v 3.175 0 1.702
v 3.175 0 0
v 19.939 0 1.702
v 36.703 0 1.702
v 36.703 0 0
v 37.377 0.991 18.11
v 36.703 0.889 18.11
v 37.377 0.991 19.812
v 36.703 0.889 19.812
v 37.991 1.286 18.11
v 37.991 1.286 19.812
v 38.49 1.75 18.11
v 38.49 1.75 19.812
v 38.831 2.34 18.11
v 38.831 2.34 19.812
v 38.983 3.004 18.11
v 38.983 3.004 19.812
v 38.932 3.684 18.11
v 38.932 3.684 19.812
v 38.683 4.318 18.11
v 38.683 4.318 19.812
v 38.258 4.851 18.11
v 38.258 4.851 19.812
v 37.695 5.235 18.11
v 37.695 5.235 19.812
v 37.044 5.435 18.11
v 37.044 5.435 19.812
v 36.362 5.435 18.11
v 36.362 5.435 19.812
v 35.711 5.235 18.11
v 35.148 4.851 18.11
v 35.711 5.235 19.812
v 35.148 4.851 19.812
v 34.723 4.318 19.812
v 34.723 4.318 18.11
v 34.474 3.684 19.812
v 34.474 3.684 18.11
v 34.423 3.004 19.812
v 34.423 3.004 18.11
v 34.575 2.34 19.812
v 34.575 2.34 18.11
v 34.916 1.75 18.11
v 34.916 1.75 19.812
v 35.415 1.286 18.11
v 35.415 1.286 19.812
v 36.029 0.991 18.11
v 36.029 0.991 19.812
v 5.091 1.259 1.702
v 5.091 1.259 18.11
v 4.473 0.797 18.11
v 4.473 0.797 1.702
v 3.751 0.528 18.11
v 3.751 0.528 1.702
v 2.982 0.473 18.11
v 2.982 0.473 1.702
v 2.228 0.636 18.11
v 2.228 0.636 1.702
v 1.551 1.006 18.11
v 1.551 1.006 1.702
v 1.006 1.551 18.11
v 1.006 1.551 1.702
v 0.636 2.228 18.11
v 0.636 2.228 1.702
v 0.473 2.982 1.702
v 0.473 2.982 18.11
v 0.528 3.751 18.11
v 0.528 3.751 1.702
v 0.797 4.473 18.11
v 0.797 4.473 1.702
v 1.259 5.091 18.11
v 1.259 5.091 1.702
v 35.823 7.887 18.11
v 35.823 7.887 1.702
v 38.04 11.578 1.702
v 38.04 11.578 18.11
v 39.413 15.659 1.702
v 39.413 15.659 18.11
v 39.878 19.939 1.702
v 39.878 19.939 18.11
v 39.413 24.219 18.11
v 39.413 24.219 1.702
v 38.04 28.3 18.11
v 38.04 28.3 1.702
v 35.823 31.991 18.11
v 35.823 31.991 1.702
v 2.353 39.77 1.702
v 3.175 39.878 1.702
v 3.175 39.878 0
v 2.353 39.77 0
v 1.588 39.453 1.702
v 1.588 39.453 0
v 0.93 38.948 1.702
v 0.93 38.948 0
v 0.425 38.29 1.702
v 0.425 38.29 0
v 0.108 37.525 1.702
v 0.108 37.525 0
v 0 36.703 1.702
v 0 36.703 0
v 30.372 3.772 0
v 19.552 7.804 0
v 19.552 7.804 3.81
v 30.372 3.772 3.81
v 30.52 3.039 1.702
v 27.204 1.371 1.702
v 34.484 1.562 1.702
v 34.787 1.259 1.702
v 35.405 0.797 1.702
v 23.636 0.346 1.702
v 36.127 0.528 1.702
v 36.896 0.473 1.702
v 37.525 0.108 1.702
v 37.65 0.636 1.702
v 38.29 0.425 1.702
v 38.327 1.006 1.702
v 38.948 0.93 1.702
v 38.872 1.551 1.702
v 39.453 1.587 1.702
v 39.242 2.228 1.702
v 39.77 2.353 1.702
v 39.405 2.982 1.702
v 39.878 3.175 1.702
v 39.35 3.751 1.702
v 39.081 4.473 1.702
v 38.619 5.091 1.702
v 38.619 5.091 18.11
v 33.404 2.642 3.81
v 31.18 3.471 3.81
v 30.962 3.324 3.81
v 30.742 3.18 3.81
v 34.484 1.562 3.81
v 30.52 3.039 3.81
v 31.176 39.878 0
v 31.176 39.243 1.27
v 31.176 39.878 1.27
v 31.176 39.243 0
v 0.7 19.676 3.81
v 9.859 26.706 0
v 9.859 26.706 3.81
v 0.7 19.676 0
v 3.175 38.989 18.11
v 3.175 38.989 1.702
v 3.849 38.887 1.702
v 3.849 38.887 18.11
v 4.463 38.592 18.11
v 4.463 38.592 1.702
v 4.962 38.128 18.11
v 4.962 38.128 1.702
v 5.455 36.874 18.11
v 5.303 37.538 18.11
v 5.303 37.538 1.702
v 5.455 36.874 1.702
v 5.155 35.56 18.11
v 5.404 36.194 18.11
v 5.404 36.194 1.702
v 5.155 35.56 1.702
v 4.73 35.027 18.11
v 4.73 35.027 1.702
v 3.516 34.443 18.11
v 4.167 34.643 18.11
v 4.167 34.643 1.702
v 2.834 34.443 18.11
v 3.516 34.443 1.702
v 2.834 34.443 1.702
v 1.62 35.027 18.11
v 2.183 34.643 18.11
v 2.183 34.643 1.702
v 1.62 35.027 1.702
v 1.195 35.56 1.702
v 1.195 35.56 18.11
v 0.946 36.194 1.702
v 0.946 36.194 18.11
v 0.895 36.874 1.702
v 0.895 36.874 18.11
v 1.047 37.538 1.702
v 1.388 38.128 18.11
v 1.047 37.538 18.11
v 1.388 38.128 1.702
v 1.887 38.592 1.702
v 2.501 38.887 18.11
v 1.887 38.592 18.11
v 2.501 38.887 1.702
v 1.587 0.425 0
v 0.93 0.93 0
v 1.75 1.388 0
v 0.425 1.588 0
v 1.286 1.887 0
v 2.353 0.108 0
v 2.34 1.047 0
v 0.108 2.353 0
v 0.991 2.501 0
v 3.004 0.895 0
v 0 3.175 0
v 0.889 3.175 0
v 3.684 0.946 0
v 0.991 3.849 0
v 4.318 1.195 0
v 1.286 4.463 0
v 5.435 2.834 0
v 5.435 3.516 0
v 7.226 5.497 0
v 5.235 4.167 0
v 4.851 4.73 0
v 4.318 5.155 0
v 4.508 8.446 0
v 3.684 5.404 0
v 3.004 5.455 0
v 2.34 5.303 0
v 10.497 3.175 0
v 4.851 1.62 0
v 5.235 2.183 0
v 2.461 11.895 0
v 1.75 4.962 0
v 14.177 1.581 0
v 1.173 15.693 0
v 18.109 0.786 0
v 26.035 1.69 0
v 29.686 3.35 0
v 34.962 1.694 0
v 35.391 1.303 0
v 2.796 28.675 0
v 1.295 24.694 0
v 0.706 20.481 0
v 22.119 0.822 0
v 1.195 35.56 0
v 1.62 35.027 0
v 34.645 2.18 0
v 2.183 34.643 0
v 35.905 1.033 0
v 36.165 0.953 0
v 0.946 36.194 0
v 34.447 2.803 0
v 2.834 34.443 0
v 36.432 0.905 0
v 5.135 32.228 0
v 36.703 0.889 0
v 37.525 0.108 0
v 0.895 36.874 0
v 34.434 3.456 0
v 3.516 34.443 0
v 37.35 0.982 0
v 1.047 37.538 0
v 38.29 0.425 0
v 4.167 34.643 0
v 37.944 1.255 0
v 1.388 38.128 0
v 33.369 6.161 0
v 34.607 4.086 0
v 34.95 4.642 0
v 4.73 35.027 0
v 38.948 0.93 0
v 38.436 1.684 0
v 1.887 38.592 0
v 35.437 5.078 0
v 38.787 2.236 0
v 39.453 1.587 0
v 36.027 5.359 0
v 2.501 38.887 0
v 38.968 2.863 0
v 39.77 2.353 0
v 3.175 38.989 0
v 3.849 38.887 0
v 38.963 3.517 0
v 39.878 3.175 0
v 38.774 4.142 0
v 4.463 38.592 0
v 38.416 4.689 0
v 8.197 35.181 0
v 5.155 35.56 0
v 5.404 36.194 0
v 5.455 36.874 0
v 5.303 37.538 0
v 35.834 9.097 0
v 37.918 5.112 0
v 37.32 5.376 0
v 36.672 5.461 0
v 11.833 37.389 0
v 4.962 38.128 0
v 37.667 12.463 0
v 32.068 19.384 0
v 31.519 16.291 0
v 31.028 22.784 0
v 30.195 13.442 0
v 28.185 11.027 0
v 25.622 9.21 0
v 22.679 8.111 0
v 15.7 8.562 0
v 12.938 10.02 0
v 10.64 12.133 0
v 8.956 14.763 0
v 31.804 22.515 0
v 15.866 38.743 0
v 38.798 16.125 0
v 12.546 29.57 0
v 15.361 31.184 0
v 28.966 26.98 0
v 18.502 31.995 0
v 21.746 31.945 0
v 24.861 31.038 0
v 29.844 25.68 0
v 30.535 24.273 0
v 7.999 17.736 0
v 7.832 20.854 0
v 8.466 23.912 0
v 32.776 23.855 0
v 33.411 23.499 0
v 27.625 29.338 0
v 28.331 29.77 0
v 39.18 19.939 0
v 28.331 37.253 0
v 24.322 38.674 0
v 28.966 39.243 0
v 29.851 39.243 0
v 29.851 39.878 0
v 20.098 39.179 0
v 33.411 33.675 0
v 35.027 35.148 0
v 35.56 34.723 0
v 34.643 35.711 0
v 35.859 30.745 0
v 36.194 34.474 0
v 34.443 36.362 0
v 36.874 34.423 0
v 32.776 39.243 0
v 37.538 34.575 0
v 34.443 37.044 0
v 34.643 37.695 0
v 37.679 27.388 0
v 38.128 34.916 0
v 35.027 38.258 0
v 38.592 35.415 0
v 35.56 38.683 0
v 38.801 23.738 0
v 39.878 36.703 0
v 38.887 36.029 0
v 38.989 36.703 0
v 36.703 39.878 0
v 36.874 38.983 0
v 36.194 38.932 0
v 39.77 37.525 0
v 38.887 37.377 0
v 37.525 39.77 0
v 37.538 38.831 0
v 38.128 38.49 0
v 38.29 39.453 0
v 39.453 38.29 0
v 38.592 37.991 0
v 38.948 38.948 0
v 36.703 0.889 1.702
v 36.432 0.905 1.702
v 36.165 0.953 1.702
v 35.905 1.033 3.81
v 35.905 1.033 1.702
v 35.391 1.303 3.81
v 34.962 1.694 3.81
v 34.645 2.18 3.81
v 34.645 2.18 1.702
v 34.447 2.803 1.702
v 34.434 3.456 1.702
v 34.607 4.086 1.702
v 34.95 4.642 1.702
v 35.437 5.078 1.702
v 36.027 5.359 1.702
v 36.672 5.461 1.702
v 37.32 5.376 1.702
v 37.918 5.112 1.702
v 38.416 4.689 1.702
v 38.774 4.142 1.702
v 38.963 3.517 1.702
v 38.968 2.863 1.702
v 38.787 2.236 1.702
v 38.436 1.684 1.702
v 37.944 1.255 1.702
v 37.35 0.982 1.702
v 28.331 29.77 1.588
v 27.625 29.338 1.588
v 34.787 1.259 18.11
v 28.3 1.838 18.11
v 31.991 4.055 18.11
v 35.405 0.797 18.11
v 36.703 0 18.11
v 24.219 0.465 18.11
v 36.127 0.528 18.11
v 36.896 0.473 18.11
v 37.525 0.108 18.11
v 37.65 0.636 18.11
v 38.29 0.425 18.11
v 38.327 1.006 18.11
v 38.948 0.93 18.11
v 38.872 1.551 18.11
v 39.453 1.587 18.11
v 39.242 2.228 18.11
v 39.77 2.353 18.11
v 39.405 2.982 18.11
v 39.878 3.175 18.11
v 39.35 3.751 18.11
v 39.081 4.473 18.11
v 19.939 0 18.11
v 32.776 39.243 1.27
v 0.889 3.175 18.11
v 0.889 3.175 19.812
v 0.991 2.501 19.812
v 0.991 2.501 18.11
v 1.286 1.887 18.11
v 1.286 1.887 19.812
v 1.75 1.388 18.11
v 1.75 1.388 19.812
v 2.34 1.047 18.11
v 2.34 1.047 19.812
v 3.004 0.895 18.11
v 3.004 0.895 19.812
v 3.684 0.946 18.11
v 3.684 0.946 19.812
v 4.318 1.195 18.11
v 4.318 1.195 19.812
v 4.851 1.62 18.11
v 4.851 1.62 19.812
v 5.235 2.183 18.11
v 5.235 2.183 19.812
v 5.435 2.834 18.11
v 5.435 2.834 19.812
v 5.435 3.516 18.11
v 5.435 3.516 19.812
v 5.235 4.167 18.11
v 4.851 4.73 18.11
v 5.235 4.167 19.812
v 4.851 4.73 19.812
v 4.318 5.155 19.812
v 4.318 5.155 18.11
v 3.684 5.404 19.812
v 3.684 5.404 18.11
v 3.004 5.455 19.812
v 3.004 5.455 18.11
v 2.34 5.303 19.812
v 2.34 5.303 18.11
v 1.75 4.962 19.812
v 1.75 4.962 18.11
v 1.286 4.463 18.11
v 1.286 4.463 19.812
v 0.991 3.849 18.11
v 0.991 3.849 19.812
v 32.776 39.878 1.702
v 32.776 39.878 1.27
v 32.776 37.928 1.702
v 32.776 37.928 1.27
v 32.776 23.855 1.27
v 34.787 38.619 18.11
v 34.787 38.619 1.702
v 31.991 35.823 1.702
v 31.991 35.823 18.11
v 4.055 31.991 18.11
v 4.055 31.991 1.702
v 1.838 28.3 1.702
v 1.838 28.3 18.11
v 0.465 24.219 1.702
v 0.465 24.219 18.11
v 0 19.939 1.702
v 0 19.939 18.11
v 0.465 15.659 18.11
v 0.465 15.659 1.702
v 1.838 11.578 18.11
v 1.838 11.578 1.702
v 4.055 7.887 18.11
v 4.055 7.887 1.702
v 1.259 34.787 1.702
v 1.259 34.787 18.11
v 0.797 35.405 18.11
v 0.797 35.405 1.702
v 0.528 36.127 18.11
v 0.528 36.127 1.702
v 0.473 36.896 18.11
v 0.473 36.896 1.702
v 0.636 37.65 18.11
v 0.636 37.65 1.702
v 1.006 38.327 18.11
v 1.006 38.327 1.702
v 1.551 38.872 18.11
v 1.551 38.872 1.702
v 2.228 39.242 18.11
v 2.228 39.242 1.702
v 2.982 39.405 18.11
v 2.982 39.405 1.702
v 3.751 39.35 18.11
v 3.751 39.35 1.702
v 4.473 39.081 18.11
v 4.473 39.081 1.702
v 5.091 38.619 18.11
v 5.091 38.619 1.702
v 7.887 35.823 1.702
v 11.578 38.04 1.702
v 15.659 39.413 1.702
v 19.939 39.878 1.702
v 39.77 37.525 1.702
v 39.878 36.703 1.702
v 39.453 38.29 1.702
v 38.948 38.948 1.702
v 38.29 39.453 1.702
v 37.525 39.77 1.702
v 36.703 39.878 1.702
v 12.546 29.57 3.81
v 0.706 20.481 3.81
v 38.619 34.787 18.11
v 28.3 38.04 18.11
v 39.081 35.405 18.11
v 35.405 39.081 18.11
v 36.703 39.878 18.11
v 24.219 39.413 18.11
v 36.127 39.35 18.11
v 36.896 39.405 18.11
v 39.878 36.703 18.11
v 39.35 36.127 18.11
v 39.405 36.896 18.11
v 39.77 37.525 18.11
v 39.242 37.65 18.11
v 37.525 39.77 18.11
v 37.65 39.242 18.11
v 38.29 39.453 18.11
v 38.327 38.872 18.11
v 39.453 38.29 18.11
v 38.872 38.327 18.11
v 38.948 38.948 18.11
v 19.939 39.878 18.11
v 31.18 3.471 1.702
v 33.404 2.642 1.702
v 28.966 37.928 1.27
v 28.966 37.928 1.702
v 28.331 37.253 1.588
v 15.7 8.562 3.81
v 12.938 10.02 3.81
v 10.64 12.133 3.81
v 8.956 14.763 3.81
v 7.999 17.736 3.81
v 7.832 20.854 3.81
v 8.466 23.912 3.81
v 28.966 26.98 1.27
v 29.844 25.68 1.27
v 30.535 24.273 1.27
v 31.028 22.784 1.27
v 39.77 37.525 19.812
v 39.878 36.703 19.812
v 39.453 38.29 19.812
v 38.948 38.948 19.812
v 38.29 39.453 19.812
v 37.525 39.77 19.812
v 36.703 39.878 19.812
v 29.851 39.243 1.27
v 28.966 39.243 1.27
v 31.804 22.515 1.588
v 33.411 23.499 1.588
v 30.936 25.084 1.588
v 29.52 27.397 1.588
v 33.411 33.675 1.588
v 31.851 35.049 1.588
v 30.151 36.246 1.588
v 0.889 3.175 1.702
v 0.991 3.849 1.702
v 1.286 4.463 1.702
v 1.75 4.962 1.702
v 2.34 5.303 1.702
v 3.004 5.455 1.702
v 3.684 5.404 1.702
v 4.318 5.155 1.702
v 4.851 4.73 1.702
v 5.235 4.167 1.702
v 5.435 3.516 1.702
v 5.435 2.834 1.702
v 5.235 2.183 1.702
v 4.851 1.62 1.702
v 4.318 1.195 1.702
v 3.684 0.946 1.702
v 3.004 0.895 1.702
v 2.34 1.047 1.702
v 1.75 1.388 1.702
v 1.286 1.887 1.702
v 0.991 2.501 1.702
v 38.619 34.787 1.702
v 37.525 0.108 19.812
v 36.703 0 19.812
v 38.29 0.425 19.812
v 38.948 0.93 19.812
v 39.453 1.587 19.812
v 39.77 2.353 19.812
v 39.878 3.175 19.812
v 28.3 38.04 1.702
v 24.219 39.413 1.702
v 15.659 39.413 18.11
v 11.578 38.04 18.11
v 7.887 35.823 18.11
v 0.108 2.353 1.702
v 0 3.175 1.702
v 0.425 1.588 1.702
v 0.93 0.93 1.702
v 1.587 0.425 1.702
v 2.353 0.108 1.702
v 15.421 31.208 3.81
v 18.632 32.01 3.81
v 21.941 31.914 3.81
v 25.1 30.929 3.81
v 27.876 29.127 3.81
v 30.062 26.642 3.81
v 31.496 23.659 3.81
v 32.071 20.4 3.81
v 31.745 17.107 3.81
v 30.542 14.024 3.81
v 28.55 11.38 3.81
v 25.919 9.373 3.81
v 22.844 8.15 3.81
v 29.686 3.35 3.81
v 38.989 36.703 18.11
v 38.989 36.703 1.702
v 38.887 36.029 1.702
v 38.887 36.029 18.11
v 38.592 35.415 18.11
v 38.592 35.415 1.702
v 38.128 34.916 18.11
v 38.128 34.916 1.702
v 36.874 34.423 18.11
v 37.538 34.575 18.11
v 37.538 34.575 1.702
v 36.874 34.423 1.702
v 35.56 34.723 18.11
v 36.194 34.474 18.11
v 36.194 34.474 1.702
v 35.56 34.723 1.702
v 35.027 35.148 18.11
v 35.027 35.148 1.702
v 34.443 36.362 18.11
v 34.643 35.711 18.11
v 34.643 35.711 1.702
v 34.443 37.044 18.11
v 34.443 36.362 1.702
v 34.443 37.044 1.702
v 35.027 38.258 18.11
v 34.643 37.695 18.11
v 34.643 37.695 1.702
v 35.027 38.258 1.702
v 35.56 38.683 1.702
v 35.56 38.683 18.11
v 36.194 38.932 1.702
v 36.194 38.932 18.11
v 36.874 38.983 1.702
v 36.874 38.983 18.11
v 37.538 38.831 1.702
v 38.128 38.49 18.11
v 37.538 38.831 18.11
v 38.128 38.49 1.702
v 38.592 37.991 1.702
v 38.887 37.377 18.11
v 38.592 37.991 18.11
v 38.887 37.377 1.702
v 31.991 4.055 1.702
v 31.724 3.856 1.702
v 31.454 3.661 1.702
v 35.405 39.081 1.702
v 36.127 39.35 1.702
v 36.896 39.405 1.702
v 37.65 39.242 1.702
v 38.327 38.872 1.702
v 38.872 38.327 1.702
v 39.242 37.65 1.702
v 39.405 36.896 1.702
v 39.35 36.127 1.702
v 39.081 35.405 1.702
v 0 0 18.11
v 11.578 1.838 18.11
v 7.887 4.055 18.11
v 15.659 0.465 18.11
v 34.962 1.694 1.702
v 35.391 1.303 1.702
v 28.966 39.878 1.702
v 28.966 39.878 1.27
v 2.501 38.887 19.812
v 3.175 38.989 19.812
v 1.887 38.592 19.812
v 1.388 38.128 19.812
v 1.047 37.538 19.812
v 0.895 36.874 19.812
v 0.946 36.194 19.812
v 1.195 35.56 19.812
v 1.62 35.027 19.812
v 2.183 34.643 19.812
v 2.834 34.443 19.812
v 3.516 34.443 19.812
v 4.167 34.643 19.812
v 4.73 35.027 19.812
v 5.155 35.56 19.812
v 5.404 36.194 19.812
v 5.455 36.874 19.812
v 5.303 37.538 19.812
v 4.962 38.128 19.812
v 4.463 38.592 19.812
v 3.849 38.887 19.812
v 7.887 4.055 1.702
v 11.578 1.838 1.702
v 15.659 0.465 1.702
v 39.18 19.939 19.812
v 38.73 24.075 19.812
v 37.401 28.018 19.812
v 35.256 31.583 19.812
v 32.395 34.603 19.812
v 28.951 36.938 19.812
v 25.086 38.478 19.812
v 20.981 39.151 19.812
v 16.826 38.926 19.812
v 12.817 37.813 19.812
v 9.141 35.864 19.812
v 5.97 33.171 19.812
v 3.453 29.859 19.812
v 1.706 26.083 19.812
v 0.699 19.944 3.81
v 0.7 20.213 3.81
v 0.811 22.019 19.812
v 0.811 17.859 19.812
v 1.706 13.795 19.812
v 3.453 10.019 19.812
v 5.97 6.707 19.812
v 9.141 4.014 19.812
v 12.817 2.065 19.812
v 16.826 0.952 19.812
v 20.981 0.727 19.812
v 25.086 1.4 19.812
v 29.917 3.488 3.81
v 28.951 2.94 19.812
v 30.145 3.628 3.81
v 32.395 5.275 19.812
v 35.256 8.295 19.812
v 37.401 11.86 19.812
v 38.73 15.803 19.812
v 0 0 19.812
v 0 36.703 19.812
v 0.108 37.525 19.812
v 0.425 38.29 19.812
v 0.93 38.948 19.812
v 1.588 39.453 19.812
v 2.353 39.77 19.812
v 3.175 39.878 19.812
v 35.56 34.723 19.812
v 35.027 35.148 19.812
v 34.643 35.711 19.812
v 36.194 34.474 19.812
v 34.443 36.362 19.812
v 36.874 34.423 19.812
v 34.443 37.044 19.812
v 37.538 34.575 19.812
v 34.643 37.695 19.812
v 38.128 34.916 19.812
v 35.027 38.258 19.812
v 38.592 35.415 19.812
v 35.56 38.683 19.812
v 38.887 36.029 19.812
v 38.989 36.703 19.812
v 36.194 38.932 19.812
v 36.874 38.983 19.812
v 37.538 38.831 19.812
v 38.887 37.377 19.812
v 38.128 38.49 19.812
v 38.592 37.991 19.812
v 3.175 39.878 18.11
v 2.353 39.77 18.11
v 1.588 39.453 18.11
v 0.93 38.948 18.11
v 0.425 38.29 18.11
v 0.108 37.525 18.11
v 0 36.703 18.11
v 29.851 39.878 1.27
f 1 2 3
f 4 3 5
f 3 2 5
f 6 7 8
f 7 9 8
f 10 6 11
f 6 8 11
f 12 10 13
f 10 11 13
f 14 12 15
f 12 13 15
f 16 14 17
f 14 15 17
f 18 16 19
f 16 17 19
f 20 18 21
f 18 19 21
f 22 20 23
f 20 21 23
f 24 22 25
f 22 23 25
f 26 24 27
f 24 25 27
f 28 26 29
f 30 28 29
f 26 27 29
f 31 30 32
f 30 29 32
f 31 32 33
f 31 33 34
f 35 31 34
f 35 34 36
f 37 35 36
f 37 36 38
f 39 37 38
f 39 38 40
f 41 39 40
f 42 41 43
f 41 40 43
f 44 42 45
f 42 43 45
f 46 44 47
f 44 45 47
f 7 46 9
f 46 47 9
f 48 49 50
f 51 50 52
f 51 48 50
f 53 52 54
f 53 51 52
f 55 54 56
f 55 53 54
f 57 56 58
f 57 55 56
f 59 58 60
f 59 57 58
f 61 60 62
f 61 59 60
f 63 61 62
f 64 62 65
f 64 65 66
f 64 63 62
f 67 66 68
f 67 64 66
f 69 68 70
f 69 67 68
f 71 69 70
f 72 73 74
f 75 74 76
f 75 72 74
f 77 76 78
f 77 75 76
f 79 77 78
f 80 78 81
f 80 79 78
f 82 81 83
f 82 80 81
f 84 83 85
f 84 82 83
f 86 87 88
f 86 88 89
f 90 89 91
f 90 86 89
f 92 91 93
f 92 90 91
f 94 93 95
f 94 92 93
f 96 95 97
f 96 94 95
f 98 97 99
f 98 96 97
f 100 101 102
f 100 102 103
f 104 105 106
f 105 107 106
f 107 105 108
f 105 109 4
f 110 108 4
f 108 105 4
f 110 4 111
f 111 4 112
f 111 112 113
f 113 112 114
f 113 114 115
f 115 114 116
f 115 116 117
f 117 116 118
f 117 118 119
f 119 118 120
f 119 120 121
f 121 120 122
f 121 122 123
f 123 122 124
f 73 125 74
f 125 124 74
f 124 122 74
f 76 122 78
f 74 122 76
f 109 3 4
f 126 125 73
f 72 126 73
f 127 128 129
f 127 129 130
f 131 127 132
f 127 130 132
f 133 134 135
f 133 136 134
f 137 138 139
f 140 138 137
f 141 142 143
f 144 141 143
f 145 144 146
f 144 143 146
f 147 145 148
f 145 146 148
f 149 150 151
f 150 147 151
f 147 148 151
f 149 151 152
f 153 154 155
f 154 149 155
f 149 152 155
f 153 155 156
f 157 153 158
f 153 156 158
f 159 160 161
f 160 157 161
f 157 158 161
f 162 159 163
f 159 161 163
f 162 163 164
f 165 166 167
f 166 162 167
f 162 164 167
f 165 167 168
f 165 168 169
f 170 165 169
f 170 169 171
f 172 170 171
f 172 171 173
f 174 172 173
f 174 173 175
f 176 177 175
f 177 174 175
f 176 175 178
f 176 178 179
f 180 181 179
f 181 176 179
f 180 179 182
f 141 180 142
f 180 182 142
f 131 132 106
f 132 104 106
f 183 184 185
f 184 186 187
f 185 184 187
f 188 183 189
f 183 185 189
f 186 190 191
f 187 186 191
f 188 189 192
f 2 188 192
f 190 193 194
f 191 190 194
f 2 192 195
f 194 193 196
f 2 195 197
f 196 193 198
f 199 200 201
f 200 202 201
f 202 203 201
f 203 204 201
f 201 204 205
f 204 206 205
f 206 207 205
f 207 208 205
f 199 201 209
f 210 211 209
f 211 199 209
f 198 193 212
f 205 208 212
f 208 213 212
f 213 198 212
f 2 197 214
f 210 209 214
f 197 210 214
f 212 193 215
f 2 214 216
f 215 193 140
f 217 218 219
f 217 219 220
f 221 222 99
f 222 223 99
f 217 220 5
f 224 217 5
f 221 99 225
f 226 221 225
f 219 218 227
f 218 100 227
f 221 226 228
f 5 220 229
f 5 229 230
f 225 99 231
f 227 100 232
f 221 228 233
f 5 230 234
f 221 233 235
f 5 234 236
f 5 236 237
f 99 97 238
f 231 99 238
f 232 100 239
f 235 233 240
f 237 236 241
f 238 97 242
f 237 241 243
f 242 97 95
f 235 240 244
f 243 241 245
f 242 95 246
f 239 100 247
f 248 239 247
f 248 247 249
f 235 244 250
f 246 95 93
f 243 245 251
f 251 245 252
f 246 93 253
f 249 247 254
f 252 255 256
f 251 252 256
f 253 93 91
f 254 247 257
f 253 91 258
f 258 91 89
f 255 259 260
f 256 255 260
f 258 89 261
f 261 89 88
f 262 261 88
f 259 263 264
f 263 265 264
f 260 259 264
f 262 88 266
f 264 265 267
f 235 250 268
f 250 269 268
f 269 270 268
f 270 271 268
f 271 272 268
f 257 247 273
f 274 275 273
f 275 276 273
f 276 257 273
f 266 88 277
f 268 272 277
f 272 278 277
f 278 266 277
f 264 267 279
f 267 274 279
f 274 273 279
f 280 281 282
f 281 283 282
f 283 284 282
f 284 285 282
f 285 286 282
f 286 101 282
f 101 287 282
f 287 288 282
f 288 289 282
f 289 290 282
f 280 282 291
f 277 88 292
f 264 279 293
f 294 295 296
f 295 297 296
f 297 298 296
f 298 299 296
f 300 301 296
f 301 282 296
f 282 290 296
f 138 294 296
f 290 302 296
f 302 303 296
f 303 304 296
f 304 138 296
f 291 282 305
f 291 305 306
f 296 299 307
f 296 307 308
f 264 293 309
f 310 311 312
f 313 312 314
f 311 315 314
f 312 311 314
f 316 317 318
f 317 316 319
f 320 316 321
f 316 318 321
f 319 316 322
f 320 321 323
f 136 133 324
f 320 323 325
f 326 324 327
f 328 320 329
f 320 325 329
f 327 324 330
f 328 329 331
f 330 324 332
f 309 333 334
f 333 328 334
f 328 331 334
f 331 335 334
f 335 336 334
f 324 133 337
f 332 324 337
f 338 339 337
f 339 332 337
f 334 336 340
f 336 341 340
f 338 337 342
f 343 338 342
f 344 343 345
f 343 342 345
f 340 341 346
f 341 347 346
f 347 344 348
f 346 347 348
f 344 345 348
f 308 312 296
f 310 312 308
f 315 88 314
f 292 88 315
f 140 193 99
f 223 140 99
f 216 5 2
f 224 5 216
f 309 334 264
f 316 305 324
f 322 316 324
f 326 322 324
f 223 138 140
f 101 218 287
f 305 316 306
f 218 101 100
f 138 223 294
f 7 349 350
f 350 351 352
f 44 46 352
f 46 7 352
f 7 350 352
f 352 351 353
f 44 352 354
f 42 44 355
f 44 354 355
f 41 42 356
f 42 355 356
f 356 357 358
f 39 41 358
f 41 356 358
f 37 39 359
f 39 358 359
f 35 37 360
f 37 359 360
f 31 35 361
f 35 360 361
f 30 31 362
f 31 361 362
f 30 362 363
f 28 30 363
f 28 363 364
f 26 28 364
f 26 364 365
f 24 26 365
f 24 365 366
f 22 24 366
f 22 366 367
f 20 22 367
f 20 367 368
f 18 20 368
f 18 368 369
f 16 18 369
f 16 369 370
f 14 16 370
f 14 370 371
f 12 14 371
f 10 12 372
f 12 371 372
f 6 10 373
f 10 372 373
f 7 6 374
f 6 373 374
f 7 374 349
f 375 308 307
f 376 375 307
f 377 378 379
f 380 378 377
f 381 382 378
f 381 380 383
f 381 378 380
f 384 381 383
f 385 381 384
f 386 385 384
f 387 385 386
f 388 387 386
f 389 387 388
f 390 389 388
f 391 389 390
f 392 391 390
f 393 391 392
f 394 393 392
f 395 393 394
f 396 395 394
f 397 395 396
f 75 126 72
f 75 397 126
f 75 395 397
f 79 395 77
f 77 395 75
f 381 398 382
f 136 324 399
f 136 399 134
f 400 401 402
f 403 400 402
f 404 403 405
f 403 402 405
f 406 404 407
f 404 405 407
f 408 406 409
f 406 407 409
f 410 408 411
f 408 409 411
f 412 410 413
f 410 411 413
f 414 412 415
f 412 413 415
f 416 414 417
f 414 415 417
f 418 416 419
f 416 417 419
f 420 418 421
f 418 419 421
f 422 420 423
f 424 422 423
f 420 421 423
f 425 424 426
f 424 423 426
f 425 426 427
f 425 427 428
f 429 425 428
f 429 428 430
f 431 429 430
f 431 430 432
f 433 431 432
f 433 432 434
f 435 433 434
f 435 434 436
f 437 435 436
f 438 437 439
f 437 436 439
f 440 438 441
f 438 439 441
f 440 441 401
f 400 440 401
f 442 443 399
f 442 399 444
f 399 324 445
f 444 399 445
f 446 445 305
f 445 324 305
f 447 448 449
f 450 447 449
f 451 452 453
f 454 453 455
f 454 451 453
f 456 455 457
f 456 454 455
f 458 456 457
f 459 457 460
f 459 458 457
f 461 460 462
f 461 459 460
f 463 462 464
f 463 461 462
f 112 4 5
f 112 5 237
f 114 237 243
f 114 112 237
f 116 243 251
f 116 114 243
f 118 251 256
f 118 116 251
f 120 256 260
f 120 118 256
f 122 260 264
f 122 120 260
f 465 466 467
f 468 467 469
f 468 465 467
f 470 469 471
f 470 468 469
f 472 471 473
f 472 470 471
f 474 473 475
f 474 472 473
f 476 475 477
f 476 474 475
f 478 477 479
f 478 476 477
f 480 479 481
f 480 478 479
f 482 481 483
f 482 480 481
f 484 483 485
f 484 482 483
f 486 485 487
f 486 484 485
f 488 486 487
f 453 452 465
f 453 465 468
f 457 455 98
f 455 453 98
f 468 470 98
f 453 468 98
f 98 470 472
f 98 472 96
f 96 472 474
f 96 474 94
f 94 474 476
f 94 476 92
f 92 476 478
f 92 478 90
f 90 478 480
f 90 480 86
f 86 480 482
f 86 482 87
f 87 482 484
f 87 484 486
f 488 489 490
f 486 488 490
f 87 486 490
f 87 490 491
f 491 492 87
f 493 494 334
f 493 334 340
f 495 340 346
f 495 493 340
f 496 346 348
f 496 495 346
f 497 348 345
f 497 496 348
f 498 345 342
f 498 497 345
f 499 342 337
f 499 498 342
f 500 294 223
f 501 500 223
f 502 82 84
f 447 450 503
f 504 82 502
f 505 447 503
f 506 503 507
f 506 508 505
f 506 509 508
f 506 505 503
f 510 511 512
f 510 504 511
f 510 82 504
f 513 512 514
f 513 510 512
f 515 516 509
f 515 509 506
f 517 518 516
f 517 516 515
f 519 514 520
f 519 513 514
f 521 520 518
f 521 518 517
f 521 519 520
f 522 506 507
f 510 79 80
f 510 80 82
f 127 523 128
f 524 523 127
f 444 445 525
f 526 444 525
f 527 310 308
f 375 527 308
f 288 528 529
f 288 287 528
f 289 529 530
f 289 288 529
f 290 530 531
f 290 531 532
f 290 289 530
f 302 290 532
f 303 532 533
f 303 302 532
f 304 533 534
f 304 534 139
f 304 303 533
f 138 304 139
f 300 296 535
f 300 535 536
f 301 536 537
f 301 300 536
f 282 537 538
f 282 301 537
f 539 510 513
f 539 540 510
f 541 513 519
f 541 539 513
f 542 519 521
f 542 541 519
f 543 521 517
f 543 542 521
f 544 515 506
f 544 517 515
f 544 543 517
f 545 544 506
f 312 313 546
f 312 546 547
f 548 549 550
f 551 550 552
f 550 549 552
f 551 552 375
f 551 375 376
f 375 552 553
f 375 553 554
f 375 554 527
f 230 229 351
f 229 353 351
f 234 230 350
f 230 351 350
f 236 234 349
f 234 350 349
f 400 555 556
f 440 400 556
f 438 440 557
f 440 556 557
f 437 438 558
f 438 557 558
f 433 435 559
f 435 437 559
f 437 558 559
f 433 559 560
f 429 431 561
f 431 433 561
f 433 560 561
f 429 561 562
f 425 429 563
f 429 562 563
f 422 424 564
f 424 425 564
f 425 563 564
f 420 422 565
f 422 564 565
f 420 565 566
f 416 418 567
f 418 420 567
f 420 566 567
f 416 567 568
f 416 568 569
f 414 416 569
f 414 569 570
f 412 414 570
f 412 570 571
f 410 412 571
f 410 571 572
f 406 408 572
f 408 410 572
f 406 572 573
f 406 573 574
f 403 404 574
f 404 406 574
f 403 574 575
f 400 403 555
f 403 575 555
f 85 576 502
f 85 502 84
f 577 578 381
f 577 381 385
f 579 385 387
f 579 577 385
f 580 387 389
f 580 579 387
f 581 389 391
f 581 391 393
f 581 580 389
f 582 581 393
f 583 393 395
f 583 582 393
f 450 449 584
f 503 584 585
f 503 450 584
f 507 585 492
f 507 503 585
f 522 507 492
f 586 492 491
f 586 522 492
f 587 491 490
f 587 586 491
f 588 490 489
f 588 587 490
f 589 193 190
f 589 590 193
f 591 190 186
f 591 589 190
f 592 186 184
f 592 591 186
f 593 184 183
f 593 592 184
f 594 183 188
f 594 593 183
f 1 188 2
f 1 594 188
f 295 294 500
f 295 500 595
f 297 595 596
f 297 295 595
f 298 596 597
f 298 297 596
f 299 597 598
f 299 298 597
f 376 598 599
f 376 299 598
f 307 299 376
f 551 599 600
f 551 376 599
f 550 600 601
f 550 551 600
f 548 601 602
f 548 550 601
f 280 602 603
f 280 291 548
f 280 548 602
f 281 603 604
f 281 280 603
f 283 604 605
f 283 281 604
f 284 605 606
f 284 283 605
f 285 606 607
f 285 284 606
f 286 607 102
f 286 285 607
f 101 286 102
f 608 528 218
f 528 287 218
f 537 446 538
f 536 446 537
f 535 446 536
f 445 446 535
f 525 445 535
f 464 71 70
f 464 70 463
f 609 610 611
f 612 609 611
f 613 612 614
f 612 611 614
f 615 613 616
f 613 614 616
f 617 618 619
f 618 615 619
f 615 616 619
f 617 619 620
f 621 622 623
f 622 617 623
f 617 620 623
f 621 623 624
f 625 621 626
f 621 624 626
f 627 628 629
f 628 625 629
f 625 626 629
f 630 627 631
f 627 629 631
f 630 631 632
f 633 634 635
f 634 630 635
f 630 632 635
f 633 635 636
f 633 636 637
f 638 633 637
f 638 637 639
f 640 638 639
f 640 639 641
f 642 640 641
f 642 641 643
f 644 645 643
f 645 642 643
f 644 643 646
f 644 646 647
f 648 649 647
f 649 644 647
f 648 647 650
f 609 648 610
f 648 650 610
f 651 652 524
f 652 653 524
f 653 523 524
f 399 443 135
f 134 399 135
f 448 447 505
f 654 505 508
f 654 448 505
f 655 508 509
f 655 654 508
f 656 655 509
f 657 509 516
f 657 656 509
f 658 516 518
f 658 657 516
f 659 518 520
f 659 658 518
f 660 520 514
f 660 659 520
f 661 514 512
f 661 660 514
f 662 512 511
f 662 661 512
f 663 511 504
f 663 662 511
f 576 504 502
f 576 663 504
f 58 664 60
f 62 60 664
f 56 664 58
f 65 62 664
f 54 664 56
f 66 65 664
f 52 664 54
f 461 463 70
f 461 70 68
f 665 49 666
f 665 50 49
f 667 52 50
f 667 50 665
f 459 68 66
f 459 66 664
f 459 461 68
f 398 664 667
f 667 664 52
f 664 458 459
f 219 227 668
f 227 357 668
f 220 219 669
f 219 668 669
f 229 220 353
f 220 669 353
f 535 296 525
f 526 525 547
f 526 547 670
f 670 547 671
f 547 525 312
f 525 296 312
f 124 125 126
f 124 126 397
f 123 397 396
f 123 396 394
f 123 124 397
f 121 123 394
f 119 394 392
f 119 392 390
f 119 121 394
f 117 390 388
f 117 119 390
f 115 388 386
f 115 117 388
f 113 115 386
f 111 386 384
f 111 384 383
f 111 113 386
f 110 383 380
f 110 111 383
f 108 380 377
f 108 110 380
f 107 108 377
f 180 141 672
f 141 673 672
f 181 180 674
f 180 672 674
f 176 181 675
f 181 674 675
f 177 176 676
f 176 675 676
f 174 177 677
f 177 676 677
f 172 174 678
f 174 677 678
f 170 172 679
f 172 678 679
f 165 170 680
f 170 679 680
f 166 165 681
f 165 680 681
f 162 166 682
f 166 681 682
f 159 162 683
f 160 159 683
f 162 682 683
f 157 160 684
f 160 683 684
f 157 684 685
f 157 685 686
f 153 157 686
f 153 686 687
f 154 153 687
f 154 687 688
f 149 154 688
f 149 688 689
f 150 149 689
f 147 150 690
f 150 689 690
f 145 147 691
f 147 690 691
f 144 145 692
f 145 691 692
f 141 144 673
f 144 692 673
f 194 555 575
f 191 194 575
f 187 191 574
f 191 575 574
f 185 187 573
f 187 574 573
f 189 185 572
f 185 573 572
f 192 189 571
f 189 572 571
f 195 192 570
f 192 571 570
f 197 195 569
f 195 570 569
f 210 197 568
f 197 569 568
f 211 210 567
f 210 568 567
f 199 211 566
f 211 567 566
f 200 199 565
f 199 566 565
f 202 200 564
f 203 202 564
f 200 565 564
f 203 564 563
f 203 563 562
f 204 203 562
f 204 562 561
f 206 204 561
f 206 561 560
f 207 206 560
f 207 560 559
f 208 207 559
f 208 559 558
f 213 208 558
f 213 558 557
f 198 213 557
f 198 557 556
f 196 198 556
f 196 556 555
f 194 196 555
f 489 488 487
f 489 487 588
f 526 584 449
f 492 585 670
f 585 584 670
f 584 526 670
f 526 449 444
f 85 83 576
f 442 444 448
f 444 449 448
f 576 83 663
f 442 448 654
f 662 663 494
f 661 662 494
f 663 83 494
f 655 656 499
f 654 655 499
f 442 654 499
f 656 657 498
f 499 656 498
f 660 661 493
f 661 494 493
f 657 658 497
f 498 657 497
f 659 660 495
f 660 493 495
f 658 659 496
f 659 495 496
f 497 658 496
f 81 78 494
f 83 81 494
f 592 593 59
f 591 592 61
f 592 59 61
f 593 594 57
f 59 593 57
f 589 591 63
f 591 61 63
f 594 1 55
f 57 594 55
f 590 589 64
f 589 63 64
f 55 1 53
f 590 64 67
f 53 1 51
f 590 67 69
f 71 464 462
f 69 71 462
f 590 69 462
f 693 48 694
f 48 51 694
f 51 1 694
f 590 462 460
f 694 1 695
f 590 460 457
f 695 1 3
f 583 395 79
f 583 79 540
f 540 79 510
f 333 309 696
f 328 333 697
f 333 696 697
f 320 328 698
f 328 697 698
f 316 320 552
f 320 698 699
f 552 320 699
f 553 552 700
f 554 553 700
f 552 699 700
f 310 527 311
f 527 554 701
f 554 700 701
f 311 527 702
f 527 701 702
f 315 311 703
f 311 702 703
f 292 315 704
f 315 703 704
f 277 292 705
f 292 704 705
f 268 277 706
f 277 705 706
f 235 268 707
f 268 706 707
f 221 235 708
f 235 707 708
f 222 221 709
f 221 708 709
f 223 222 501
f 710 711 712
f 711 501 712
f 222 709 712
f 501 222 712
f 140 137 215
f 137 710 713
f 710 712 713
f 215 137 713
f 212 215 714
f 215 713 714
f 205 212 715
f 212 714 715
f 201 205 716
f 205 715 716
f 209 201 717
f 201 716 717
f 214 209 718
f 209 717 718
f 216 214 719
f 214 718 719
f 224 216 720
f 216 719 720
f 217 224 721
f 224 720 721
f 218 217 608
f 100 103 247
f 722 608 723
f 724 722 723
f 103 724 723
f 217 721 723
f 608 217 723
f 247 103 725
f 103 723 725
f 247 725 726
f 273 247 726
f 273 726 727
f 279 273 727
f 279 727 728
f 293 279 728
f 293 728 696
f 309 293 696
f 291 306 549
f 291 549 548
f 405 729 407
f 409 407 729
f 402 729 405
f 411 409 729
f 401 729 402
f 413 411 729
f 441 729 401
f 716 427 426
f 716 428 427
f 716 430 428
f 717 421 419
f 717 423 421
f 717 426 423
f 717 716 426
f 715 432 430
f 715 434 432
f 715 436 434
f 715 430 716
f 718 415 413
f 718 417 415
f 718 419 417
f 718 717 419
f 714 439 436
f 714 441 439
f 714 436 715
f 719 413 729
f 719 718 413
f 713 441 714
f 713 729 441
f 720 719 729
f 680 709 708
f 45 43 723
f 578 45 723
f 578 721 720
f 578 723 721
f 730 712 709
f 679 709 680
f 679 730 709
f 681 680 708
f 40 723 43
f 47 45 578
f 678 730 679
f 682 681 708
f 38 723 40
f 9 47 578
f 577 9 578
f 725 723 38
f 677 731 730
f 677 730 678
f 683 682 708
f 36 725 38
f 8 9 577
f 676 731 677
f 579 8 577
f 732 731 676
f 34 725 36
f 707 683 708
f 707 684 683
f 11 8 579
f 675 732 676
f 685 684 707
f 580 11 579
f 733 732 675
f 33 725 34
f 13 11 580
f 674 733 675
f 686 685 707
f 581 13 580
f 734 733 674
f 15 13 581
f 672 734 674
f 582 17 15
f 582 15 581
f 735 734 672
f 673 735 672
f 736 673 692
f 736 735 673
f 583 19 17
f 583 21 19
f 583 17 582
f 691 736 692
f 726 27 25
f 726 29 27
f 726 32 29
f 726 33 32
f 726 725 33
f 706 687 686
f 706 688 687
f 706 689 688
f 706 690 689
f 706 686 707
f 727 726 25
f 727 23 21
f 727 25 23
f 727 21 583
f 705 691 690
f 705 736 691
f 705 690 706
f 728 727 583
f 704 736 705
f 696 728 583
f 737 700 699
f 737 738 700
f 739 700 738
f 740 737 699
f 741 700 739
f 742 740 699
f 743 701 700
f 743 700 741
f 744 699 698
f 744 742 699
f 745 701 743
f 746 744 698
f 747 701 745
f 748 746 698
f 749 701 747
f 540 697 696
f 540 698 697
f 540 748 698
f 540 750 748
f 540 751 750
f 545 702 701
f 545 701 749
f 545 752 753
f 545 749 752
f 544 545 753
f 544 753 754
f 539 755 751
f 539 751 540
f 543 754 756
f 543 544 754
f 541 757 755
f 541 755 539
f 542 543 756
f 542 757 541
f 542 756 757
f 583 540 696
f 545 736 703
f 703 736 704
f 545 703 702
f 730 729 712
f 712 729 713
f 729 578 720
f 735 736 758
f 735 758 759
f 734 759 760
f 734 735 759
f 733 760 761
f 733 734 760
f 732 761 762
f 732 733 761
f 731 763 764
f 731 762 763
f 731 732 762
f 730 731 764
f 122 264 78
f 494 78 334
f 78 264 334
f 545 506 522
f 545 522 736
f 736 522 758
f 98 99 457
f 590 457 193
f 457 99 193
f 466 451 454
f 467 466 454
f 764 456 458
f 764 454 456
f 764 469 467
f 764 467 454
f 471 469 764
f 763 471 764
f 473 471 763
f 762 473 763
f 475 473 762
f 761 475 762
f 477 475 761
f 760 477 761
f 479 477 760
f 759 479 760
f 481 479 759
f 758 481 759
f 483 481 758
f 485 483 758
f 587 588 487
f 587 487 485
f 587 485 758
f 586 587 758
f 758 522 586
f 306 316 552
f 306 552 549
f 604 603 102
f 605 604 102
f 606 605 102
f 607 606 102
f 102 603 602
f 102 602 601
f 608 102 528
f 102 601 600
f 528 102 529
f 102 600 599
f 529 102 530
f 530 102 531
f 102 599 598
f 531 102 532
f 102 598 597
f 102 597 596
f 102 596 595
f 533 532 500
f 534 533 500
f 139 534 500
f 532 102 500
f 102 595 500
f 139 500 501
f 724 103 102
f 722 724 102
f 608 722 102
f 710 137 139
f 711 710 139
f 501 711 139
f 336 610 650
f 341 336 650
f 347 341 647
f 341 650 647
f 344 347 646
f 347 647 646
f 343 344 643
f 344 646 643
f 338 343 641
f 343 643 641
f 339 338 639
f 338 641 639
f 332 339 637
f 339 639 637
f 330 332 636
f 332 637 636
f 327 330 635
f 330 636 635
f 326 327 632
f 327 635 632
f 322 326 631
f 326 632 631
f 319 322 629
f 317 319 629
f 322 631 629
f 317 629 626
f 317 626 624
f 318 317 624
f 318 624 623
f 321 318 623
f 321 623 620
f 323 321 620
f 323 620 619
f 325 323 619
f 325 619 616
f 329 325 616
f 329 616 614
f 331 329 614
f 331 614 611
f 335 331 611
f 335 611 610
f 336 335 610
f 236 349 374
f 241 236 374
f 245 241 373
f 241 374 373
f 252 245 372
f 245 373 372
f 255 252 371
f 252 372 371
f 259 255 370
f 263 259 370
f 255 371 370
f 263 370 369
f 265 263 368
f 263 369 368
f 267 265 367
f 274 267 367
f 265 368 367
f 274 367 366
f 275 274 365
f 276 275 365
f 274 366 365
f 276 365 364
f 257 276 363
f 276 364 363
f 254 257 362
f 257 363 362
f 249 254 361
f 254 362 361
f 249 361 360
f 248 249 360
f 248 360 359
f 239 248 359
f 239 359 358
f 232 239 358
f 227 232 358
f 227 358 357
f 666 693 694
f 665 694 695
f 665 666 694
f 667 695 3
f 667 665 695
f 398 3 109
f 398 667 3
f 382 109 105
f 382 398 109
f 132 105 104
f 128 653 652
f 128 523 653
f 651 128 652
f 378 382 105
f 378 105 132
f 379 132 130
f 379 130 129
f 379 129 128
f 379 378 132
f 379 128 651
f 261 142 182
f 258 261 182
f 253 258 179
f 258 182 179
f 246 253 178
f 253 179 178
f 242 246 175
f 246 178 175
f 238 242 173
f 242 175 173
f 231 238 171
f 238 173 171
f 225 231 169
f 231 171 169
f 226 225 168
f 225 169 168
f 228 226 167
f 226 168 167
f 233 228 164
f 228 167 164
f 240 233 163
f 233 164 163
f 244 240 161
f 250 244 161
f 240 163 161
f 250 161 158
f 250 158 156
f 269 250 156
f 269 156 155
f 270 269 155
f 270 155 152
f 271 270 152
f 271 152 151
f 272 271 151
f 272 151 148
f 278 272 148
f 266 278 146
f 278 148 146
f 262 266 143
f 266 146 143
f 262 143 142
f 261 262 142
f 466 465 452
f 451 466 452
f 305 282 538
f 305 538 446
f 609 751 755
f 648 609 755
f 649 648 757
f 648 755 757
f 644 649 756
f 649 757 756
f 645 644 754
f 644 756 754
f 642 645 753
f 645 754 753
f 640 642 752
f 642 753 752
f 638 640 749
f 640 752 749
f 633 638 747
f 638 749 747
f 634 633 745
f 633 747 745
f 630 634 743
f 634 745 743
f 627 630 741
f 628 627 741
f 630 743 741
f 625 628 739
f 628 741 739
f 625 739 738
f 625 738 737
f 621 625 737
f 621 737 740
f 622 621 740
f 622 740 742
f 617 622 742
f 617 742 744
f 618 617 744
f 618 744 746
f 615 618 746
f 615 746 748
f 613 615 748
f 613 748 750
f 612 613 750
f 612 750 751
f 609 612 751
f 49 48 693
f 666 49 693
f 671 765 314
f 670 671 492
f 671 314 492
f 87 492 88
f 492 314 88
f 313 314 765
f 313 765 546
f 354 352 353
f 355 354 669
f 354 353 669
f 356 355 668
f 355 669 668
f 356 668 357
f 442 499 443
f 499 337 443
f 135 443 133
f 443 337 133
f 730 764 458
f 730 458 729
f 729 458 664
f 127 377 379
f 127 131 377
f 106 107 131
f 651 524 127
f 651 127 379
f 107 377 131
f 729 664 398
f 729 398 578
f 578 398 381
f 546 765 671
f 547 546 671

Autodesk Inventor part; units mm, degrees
ref_plane "YZ Plane" through (0, 0, 0) normal (1, 0, 0) x (0, 1, 0)
sketch "Sketch1" plane through (0, 0, 0) normal (0, 0, 1) x (1, 0, 0)
  line L0 (0, 0) -> (39.878, 0)
  line L1 (39.878, 0) -> (39.878, 39.878)
  line L2 (39.878, 39.878) -> (0, 39.878)
  line L3 (0, 39.878) -> (0, 0)
  dimension "d0" = 39.878
  dimension "d1" = 39.878
extrude "Extrusion1" add sketch "Sketch1" along normal blind 19.812
ref_plane "Work Plane1" through (19.939, 0, 0) normal (1, 0, 0) x (0, 0, -1)
sketch "Sketch2" plane through (19.939, 0, 0) normal (1, 0, 0) x (0, 0, -1)
  line L0 (-19.812, 39.878) -> (-19.812, 0) projected
  line L1 (0, 0) -> (0, 39.878) projected
  line L2 (-19.812, 19.939) -> (0, 19.939)
  line L3 (-18.1102, 52.578) -> (-1.7018, 52.578)
  line L4 (-1.7018, 52.578) -> (-1.7018, 39.878)
  line L5 (-1.7018, 39.878) -> (-18.1102, 39.878)
  line L6 (-18.1102, 39.878) -> (-18.1102, 52.578)
  line L7 (-19.812, 39.878) -> (0, 39.878)
  dimension "d4" = 1.7018
  dimension "d5" = 1.7018
  dimension "d6" = 12.7
revolve "Revolution1" cut sketch "Sketch2" angle 360 about axis through (19.939, 19.939, 19.812) along (0, 0, -1) contours L6 L3 L4 L5
fillet "Fillet1" radius 3.175 7 edges at (39.878, 39.878, 18.9611) (39.878, 39.878, 0.8509) (0, 39.878, 18.9611) (0, 39.878, 0.8509) (0, 0, 0.8509) (39.878, 0, 0.8509) (39.878, 0, 18.9611)
sketch "Sketch3" plane through (0, 0, 19.812) normal (0, 0, 1) x (1, 0, 0)
  arc A0 (39.878, 36.703) -> (36.703, 39.878) centre (36.703, 36.703) ccw projected
  circle A1 centre (36.703, 36.703) radius 2.286
  dimension "d9" = 4.572
extrude "Extrusion2" cut sketch "Sketch3" against normal through all
sketch "Sketch4" plane through (19.939, 39.878, 1.7018) normal (0, 0, 1) x (1, 0, 0)
  circle A0 centre (16.764, -3.175) radius 2.286 projected
  arc A1 (19.939, -3.175) -> (16.764, 0) centre (16.764, -3.175) ccw projected
  arc A2 (19.939, -19.939) -> (0, 0) centre (0, -19.939) ccw projected
  line L0 (16.764, -3.175) -> (0, -19.939)
  circle A3 centre (16.764, -3.175) radius 2.7094
  line L1 (18.6798, -5.0908) -> (15.8841, -7.8866)
  line L2 (14.8482, -1.2592) -> (12.0524, -4.0549)
extrude "Extrusion3" add sketch "Sketch4" along normal up to next
pattern_circular "Circular Pattern1" count 4 over 360 about axis through (19.939, 19.939, 9.906) along (0, 0, 1) of "Extrusion2", "Extrusion3"
sketch "Sketch5" plane through (0, 0, 19.812) normal (0, 0, 1) x (1, 0, 0)
  arc A0 (19.939, 39.878) -> (7.8866, 35.8231) centre (19.939, 19.939) ccw projected
  arc A1 (31.9914, 35.8231) -> (19.939, 39.878) centre (19.939, 19.939) ccw projected
  arc A2 (31.9914, 35.8231) -> (19.939, 39.878) centre (19.939, 19.939) ccw projected
  arc A3 (19.939, 39.878) -> (7.8866, 35.8231) centre (19.939, 19.939) ccw projected
  circle A4 centre (19.939, 19.939) radius 19.2405
  dimension "d19" = 38.481
extrude "Extrusion4" cut sketch "Sketch5" against normal through all
sketch "Sketch6" plane through (0, 0, 0) normal (0, 0, -1) x (-1, 0, 0)
  circle A0 centre (-19.939, 19.939) radius 19.2405 projected
  circle A1 centre (-36.703, 3.175) radius 2.286 projected
  line L0 (-15.6996, 8.562) -> (-35.9048, 1.0329)
  line L1 (-19.5524, 7.804) -> (-34.6449, 2.18)
  line L2 (-12.546, 29.5698) -> (-0.7061, 20.4811)
  line L3 (-9.8588, 26.7065) -> (-0.7003, 19.6761)
  arc A2 (-12.546, 29.5698) -> (-19.5524, 7.804) centre (-19.939, 19.939) ccw
  arc A3 (-15.6996, 8.562) -> (-9.8588, 26.7065) centre (-19.939, 19.939) ccw
  dimension "d21" = 0.635
  dimension "d23" = 0.635
extrude "fan support1" add sketch "Sketch6" against normal blind 3.81 contours A0 L3 A3 L0 L1 A2 L2 | A0 L0 A1 L1
sketch "Sketch7" plane through (0, 0, 0) normal (0, 0, -1) x (-1, 0, 0)
  arc A0 (-12.546, 29.5698) -> (-19.5524, 7.804) centre (-19.939, 19.939) ccw projected
  arc A1 (-0.7061, 20.4811) -> (-30.3715, 3.7724) centre (-19.939, 19.939) ccw projected
  line L0 (-36.703, 39.878) -> (-3.175, 39.878) projected
  line L1 (-39.878, 3.175) -> (-39.878, 36.703) projected
  line L2 (-33.4114, 39.878) -> (-33.4114, 23.4993)
  line L3 (-28.3314, 39.878) -> (-28.3314, 29.7703)
  line L4 (-19.939, 19.939) -> (-32.8458, 27.844)
  line L5 (-33.4114, 23.4993) -> (-31.8038, 22.5147)
  line L6 (-28.3314, 29.7703) -> (-27.625, 29.3377)
  dimension "d26" = 5.08
  dimension "d27" = 8.001
  dimension "d28" = 4.0005
extrude "fan support2" add sketch "Sketch7" against normal blind 1.5875
sketch "Sketch8" plane through (0, 0, 0) normal (0, 0, -1) x (-1, 0, 0)
  line L0 (-33.4114, 33.6755) -> (-33.4114, 23.4993) projected
  line L1 (-33.4114, 23.4993) -> (-31.8038, 22.5147) projected
  line L2 (-28.3314, 29.7703) -> (-28.3314, 37.2527) projected
  line L3 (-36.703, 39.878) -> (-3.175, 39.878) projected
  line L4 (0, 36.703) -> (0, 3.175) projected
  arc A0 (-15.6996, 8.562) -> (-9.8588, 26.7065) centre (-19.939, 19.939) ccw projected
  line L5 (-31.0281, 22.7842) -> (-32.7764, 23.855)
  line L6 (-32.7764, 23.855) -> (-32.7764, 39.243)
  line L7 (-32.7764, 39.243) -> (-28.9664, 39.243)
  circle A1 centre (-19.939, 19.939) radius 11.4483
  line L8 (-28.9664, 39.243) -> (-28.9664, 26.9796)
  dimension "d31" = 22.8966
  dimension "d32" = 0.635
  dimension "d33" = 0.635
  dimension "d34" = 0.635
  dimension "d35" = 0.635
extrude "fan support3" cut sketch "Sketch8" against normal blind 1.27 contours L5 L6 L7 L8 A1
sketch "Sketch9" plane through (0, 0, 1.27) normal (0, 0, -1) x (-1, 0, 0)
  line L0 (-32.7764, 39.243) -> (-32.7764, 23.855) projected
  line L1 (-32.7764, 37.9276) -> (-28.9664, 37.9276)
  line L2 (-28.9664, 37.9276) -> (-28.9664, 40.5886)
  line L3 (-28.9664, 40.5886) -> (-32.7764, 40.5886)
  line L4 (-32.7764, 40.5886) -> (-32.7764, 37.9276)
extrude "fan support4" cut sketch "Sketch9" against normal blind 1.5557
sketch "Sketch10" plane through (0, 0, 0) normal (0, 0, -1) x (-1, 0, 0)
  line L0 (-32.7764, 39.243) -> (-28.9664, 39.243) projected
  line L1 (-36.703, 39.878) -> (-3.175, 39.878) projected
  line L2 (-31.1757, 39.878) -> (-29.8511, 39.878)
  line L3 (-29.8511, 39.878) -> (-29.8511, 39.243)
  line L4 (-29.8511, 39.243) -> (-31.1757, 39.243)
  line L5 (-31.1757, 39.243) -> (-31.1757, 39.878)
extrude "fan support5" cut sketch "Sketch10" against normal blind 1.5557
ref_plane "fan interface" through (0, 0, 5.3975) normal (0, 0, 1) x (1, 0, 0)
equation "\"d5\" = d4"
equation "\"d28\" = 0.5 * d27"
equation "\"d33\" = d32"
equation "\"d34\" = d33"
equation "\"d35\" = d34"
properties part number "fan body"
